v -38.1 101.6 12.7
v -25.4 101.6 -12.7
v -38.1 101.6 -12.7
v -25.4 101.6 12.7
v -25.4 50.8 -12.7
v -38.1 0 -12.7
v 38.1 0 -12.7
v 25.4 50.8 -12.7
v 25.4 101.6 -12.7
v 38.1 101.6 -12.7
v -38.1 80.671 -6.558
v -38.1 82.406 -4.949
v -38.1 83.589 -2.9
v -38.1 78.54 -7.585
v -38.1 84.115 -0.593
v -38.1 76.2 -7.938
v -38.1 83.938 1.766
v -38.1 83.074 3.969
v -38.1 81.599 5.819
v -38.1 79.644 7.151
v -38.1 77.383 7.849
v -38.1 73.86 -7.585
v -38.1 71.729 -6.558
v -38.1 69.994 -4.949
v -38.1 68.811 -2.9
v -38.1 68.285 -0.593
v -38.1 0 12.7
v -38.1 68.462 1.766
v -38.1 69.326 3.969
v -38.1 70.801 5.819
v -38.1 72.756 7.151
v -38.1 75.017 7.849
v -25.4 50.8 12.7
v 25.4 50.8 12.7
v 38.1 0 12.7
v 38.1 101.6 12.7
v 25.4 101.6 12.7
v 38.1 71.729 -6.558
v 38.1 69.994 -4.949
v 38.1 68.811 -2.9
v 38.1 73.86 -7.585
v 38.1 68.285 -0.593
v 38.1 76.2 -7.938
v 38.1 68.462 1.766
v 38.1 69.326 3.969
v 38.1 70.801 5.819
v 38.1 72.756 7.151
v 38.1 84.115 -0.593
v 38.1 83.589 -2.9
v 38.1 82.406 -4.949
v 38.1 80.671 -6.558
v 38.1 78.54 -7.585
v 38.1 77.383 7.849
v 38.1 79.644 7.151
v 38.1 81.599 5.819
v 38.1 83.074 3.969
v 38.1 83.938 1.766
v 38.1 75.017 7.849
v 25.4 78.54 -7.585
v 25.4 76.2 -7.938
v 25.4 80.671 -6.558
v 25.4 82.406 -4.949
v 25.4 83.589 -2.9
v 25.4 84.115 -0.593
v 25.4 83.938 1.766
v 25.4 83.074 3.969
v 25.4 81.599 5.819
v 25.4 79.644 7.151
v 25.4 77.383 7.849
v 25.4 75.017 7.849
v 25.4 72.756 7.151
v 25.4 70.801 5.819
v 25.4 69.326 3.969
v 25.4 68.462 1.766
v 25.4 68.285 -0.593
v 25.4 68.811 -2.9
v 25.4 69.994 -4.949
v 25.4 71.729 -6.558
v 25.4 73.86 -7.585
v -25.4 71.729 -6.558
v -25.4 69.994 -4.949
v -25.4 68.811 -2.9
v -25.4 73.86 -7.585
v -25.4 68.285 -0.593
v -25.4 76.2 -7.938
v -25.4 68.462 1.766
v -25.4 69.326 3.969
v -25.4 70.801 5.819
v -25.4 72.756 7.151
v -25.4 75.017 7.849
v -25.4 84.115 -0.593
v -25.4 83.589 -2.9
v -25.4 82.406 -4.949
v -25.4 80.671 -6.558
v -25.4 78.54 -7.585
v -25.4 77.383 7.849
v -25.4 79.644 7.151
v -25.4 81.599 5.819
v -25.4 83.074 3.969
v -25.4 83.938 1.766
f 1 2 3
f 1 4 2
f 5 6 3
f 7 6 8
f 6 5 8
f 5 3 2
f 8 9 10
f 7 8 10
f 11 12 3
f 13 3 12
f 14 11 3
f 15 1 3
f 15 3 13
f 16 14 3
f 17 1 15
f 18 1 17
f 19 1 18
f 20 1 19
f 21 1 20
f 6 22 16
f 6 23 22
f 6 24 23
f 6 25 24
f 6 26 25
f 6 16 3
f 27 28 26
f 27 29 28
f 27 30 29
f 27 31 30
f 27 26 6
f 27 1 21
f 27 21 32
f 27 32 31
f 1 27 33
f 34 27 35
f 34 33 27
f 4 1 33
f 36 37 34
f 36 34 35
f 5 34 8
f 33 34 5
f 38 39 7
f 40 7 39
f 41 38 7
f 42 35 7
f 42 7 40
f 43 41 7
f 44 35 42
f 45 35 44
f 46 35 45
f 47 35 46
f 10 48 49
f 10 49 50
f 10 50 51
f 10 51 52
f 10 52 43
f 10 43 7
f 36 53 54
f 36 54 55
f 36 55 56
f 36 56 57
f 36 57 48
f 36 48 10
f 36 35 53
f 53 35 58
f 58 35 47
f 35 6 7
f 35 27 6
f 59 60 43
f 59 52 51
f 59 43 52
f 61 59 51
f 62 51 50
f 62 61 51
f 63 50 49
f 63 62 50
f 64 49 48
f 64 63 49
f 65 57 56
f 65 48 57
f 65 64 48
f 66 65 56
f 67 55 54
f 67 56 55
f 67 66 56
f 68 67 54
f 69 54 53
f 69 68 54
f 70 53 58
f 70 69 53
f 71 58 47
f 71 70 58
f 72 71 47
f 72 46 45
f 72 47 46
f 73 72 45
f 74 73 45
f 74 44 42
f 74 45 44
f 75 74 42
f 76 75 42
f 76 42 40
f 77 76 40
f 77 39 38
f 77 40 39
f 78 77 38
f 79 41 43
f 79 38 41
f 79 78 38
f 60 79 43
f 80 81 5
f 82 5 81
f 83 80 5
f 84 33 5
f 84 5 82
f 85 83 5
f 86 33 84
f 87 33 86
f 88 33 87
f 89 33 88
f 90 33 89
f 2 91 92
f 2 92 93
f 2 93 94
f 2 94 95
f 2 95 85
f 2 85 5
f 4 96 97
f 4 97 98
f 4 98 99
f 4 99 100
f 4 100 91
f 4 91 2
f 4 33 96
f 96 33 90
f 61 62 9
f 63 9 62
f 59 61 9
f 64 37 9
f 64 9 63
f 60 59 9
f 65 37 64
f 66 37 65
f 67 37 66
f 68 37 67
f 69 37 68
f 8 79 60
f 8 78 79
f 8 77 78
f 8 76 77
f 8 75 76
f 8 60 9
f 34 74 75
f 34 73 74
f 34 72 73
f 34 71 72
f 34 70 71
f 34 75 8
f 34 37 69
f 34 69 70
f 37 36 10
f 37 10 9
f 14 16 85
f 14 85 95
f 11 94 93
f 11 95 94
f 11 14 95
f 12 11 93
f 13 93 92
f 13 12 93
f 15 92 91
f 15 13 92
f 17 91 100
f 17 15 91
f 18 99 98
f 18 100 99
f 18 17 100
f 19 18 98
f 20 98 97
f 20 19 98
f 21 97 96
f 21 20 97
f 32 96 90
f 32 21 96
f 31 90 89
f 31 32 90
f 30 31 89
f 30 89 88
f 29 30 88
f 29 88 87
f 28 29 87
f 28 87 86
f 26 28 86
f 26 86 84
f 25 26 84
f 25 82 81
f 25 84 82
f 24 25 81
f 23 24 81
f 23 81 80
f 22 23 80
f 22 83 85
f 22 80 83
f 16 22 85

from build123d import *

# Parameters (mm, degrees)
BOSS_EXTRUDE1_DEPTH     = 12.7
CUT_EXTRUDE1_DEPTH      = 110.249530891
CUT_EXTRUDE1_DEPTH_BACK = 110.249530891
SKETCH2_R               = 7.9375


with BuildPart() as part:
    # Sketch1 → Boss-Extrude1 (new, symmetric)
    with BuildSketch(Plane.XY):
        Polygon((-38.1, 0), (38.1, 0), (38.1, 101.6), (25.4, 101.6), (25.4, 50.8), (-25.4, 50.8), (-25.4, 101.6), (-38.1, 101.6), align=None)
    extrude(amount=BOSS_EXTRUDE1_DEPTH, both=True)

    # Sketch2 → Cut-Extrude1 (cut, two sides: drawn at the far end of the back side and taken through both)
    with BuildSketch(Plane(origin=(0, 0, 0), x_dir=(0, 0, -1), z_dir=(1, 0, 0)).offset(-CUT_EXTRUDE1_DEPTH_BACK)):
        with Locations((0, 76.2)):
            Circle(SKETCH2_R)
    extrude(amount=CUT_EXTRUDE1_DEPTH + CUT_EXTRUDE1_DEPTH_BACK, mode=Mode.SUBTRACT)


solid = part.part
